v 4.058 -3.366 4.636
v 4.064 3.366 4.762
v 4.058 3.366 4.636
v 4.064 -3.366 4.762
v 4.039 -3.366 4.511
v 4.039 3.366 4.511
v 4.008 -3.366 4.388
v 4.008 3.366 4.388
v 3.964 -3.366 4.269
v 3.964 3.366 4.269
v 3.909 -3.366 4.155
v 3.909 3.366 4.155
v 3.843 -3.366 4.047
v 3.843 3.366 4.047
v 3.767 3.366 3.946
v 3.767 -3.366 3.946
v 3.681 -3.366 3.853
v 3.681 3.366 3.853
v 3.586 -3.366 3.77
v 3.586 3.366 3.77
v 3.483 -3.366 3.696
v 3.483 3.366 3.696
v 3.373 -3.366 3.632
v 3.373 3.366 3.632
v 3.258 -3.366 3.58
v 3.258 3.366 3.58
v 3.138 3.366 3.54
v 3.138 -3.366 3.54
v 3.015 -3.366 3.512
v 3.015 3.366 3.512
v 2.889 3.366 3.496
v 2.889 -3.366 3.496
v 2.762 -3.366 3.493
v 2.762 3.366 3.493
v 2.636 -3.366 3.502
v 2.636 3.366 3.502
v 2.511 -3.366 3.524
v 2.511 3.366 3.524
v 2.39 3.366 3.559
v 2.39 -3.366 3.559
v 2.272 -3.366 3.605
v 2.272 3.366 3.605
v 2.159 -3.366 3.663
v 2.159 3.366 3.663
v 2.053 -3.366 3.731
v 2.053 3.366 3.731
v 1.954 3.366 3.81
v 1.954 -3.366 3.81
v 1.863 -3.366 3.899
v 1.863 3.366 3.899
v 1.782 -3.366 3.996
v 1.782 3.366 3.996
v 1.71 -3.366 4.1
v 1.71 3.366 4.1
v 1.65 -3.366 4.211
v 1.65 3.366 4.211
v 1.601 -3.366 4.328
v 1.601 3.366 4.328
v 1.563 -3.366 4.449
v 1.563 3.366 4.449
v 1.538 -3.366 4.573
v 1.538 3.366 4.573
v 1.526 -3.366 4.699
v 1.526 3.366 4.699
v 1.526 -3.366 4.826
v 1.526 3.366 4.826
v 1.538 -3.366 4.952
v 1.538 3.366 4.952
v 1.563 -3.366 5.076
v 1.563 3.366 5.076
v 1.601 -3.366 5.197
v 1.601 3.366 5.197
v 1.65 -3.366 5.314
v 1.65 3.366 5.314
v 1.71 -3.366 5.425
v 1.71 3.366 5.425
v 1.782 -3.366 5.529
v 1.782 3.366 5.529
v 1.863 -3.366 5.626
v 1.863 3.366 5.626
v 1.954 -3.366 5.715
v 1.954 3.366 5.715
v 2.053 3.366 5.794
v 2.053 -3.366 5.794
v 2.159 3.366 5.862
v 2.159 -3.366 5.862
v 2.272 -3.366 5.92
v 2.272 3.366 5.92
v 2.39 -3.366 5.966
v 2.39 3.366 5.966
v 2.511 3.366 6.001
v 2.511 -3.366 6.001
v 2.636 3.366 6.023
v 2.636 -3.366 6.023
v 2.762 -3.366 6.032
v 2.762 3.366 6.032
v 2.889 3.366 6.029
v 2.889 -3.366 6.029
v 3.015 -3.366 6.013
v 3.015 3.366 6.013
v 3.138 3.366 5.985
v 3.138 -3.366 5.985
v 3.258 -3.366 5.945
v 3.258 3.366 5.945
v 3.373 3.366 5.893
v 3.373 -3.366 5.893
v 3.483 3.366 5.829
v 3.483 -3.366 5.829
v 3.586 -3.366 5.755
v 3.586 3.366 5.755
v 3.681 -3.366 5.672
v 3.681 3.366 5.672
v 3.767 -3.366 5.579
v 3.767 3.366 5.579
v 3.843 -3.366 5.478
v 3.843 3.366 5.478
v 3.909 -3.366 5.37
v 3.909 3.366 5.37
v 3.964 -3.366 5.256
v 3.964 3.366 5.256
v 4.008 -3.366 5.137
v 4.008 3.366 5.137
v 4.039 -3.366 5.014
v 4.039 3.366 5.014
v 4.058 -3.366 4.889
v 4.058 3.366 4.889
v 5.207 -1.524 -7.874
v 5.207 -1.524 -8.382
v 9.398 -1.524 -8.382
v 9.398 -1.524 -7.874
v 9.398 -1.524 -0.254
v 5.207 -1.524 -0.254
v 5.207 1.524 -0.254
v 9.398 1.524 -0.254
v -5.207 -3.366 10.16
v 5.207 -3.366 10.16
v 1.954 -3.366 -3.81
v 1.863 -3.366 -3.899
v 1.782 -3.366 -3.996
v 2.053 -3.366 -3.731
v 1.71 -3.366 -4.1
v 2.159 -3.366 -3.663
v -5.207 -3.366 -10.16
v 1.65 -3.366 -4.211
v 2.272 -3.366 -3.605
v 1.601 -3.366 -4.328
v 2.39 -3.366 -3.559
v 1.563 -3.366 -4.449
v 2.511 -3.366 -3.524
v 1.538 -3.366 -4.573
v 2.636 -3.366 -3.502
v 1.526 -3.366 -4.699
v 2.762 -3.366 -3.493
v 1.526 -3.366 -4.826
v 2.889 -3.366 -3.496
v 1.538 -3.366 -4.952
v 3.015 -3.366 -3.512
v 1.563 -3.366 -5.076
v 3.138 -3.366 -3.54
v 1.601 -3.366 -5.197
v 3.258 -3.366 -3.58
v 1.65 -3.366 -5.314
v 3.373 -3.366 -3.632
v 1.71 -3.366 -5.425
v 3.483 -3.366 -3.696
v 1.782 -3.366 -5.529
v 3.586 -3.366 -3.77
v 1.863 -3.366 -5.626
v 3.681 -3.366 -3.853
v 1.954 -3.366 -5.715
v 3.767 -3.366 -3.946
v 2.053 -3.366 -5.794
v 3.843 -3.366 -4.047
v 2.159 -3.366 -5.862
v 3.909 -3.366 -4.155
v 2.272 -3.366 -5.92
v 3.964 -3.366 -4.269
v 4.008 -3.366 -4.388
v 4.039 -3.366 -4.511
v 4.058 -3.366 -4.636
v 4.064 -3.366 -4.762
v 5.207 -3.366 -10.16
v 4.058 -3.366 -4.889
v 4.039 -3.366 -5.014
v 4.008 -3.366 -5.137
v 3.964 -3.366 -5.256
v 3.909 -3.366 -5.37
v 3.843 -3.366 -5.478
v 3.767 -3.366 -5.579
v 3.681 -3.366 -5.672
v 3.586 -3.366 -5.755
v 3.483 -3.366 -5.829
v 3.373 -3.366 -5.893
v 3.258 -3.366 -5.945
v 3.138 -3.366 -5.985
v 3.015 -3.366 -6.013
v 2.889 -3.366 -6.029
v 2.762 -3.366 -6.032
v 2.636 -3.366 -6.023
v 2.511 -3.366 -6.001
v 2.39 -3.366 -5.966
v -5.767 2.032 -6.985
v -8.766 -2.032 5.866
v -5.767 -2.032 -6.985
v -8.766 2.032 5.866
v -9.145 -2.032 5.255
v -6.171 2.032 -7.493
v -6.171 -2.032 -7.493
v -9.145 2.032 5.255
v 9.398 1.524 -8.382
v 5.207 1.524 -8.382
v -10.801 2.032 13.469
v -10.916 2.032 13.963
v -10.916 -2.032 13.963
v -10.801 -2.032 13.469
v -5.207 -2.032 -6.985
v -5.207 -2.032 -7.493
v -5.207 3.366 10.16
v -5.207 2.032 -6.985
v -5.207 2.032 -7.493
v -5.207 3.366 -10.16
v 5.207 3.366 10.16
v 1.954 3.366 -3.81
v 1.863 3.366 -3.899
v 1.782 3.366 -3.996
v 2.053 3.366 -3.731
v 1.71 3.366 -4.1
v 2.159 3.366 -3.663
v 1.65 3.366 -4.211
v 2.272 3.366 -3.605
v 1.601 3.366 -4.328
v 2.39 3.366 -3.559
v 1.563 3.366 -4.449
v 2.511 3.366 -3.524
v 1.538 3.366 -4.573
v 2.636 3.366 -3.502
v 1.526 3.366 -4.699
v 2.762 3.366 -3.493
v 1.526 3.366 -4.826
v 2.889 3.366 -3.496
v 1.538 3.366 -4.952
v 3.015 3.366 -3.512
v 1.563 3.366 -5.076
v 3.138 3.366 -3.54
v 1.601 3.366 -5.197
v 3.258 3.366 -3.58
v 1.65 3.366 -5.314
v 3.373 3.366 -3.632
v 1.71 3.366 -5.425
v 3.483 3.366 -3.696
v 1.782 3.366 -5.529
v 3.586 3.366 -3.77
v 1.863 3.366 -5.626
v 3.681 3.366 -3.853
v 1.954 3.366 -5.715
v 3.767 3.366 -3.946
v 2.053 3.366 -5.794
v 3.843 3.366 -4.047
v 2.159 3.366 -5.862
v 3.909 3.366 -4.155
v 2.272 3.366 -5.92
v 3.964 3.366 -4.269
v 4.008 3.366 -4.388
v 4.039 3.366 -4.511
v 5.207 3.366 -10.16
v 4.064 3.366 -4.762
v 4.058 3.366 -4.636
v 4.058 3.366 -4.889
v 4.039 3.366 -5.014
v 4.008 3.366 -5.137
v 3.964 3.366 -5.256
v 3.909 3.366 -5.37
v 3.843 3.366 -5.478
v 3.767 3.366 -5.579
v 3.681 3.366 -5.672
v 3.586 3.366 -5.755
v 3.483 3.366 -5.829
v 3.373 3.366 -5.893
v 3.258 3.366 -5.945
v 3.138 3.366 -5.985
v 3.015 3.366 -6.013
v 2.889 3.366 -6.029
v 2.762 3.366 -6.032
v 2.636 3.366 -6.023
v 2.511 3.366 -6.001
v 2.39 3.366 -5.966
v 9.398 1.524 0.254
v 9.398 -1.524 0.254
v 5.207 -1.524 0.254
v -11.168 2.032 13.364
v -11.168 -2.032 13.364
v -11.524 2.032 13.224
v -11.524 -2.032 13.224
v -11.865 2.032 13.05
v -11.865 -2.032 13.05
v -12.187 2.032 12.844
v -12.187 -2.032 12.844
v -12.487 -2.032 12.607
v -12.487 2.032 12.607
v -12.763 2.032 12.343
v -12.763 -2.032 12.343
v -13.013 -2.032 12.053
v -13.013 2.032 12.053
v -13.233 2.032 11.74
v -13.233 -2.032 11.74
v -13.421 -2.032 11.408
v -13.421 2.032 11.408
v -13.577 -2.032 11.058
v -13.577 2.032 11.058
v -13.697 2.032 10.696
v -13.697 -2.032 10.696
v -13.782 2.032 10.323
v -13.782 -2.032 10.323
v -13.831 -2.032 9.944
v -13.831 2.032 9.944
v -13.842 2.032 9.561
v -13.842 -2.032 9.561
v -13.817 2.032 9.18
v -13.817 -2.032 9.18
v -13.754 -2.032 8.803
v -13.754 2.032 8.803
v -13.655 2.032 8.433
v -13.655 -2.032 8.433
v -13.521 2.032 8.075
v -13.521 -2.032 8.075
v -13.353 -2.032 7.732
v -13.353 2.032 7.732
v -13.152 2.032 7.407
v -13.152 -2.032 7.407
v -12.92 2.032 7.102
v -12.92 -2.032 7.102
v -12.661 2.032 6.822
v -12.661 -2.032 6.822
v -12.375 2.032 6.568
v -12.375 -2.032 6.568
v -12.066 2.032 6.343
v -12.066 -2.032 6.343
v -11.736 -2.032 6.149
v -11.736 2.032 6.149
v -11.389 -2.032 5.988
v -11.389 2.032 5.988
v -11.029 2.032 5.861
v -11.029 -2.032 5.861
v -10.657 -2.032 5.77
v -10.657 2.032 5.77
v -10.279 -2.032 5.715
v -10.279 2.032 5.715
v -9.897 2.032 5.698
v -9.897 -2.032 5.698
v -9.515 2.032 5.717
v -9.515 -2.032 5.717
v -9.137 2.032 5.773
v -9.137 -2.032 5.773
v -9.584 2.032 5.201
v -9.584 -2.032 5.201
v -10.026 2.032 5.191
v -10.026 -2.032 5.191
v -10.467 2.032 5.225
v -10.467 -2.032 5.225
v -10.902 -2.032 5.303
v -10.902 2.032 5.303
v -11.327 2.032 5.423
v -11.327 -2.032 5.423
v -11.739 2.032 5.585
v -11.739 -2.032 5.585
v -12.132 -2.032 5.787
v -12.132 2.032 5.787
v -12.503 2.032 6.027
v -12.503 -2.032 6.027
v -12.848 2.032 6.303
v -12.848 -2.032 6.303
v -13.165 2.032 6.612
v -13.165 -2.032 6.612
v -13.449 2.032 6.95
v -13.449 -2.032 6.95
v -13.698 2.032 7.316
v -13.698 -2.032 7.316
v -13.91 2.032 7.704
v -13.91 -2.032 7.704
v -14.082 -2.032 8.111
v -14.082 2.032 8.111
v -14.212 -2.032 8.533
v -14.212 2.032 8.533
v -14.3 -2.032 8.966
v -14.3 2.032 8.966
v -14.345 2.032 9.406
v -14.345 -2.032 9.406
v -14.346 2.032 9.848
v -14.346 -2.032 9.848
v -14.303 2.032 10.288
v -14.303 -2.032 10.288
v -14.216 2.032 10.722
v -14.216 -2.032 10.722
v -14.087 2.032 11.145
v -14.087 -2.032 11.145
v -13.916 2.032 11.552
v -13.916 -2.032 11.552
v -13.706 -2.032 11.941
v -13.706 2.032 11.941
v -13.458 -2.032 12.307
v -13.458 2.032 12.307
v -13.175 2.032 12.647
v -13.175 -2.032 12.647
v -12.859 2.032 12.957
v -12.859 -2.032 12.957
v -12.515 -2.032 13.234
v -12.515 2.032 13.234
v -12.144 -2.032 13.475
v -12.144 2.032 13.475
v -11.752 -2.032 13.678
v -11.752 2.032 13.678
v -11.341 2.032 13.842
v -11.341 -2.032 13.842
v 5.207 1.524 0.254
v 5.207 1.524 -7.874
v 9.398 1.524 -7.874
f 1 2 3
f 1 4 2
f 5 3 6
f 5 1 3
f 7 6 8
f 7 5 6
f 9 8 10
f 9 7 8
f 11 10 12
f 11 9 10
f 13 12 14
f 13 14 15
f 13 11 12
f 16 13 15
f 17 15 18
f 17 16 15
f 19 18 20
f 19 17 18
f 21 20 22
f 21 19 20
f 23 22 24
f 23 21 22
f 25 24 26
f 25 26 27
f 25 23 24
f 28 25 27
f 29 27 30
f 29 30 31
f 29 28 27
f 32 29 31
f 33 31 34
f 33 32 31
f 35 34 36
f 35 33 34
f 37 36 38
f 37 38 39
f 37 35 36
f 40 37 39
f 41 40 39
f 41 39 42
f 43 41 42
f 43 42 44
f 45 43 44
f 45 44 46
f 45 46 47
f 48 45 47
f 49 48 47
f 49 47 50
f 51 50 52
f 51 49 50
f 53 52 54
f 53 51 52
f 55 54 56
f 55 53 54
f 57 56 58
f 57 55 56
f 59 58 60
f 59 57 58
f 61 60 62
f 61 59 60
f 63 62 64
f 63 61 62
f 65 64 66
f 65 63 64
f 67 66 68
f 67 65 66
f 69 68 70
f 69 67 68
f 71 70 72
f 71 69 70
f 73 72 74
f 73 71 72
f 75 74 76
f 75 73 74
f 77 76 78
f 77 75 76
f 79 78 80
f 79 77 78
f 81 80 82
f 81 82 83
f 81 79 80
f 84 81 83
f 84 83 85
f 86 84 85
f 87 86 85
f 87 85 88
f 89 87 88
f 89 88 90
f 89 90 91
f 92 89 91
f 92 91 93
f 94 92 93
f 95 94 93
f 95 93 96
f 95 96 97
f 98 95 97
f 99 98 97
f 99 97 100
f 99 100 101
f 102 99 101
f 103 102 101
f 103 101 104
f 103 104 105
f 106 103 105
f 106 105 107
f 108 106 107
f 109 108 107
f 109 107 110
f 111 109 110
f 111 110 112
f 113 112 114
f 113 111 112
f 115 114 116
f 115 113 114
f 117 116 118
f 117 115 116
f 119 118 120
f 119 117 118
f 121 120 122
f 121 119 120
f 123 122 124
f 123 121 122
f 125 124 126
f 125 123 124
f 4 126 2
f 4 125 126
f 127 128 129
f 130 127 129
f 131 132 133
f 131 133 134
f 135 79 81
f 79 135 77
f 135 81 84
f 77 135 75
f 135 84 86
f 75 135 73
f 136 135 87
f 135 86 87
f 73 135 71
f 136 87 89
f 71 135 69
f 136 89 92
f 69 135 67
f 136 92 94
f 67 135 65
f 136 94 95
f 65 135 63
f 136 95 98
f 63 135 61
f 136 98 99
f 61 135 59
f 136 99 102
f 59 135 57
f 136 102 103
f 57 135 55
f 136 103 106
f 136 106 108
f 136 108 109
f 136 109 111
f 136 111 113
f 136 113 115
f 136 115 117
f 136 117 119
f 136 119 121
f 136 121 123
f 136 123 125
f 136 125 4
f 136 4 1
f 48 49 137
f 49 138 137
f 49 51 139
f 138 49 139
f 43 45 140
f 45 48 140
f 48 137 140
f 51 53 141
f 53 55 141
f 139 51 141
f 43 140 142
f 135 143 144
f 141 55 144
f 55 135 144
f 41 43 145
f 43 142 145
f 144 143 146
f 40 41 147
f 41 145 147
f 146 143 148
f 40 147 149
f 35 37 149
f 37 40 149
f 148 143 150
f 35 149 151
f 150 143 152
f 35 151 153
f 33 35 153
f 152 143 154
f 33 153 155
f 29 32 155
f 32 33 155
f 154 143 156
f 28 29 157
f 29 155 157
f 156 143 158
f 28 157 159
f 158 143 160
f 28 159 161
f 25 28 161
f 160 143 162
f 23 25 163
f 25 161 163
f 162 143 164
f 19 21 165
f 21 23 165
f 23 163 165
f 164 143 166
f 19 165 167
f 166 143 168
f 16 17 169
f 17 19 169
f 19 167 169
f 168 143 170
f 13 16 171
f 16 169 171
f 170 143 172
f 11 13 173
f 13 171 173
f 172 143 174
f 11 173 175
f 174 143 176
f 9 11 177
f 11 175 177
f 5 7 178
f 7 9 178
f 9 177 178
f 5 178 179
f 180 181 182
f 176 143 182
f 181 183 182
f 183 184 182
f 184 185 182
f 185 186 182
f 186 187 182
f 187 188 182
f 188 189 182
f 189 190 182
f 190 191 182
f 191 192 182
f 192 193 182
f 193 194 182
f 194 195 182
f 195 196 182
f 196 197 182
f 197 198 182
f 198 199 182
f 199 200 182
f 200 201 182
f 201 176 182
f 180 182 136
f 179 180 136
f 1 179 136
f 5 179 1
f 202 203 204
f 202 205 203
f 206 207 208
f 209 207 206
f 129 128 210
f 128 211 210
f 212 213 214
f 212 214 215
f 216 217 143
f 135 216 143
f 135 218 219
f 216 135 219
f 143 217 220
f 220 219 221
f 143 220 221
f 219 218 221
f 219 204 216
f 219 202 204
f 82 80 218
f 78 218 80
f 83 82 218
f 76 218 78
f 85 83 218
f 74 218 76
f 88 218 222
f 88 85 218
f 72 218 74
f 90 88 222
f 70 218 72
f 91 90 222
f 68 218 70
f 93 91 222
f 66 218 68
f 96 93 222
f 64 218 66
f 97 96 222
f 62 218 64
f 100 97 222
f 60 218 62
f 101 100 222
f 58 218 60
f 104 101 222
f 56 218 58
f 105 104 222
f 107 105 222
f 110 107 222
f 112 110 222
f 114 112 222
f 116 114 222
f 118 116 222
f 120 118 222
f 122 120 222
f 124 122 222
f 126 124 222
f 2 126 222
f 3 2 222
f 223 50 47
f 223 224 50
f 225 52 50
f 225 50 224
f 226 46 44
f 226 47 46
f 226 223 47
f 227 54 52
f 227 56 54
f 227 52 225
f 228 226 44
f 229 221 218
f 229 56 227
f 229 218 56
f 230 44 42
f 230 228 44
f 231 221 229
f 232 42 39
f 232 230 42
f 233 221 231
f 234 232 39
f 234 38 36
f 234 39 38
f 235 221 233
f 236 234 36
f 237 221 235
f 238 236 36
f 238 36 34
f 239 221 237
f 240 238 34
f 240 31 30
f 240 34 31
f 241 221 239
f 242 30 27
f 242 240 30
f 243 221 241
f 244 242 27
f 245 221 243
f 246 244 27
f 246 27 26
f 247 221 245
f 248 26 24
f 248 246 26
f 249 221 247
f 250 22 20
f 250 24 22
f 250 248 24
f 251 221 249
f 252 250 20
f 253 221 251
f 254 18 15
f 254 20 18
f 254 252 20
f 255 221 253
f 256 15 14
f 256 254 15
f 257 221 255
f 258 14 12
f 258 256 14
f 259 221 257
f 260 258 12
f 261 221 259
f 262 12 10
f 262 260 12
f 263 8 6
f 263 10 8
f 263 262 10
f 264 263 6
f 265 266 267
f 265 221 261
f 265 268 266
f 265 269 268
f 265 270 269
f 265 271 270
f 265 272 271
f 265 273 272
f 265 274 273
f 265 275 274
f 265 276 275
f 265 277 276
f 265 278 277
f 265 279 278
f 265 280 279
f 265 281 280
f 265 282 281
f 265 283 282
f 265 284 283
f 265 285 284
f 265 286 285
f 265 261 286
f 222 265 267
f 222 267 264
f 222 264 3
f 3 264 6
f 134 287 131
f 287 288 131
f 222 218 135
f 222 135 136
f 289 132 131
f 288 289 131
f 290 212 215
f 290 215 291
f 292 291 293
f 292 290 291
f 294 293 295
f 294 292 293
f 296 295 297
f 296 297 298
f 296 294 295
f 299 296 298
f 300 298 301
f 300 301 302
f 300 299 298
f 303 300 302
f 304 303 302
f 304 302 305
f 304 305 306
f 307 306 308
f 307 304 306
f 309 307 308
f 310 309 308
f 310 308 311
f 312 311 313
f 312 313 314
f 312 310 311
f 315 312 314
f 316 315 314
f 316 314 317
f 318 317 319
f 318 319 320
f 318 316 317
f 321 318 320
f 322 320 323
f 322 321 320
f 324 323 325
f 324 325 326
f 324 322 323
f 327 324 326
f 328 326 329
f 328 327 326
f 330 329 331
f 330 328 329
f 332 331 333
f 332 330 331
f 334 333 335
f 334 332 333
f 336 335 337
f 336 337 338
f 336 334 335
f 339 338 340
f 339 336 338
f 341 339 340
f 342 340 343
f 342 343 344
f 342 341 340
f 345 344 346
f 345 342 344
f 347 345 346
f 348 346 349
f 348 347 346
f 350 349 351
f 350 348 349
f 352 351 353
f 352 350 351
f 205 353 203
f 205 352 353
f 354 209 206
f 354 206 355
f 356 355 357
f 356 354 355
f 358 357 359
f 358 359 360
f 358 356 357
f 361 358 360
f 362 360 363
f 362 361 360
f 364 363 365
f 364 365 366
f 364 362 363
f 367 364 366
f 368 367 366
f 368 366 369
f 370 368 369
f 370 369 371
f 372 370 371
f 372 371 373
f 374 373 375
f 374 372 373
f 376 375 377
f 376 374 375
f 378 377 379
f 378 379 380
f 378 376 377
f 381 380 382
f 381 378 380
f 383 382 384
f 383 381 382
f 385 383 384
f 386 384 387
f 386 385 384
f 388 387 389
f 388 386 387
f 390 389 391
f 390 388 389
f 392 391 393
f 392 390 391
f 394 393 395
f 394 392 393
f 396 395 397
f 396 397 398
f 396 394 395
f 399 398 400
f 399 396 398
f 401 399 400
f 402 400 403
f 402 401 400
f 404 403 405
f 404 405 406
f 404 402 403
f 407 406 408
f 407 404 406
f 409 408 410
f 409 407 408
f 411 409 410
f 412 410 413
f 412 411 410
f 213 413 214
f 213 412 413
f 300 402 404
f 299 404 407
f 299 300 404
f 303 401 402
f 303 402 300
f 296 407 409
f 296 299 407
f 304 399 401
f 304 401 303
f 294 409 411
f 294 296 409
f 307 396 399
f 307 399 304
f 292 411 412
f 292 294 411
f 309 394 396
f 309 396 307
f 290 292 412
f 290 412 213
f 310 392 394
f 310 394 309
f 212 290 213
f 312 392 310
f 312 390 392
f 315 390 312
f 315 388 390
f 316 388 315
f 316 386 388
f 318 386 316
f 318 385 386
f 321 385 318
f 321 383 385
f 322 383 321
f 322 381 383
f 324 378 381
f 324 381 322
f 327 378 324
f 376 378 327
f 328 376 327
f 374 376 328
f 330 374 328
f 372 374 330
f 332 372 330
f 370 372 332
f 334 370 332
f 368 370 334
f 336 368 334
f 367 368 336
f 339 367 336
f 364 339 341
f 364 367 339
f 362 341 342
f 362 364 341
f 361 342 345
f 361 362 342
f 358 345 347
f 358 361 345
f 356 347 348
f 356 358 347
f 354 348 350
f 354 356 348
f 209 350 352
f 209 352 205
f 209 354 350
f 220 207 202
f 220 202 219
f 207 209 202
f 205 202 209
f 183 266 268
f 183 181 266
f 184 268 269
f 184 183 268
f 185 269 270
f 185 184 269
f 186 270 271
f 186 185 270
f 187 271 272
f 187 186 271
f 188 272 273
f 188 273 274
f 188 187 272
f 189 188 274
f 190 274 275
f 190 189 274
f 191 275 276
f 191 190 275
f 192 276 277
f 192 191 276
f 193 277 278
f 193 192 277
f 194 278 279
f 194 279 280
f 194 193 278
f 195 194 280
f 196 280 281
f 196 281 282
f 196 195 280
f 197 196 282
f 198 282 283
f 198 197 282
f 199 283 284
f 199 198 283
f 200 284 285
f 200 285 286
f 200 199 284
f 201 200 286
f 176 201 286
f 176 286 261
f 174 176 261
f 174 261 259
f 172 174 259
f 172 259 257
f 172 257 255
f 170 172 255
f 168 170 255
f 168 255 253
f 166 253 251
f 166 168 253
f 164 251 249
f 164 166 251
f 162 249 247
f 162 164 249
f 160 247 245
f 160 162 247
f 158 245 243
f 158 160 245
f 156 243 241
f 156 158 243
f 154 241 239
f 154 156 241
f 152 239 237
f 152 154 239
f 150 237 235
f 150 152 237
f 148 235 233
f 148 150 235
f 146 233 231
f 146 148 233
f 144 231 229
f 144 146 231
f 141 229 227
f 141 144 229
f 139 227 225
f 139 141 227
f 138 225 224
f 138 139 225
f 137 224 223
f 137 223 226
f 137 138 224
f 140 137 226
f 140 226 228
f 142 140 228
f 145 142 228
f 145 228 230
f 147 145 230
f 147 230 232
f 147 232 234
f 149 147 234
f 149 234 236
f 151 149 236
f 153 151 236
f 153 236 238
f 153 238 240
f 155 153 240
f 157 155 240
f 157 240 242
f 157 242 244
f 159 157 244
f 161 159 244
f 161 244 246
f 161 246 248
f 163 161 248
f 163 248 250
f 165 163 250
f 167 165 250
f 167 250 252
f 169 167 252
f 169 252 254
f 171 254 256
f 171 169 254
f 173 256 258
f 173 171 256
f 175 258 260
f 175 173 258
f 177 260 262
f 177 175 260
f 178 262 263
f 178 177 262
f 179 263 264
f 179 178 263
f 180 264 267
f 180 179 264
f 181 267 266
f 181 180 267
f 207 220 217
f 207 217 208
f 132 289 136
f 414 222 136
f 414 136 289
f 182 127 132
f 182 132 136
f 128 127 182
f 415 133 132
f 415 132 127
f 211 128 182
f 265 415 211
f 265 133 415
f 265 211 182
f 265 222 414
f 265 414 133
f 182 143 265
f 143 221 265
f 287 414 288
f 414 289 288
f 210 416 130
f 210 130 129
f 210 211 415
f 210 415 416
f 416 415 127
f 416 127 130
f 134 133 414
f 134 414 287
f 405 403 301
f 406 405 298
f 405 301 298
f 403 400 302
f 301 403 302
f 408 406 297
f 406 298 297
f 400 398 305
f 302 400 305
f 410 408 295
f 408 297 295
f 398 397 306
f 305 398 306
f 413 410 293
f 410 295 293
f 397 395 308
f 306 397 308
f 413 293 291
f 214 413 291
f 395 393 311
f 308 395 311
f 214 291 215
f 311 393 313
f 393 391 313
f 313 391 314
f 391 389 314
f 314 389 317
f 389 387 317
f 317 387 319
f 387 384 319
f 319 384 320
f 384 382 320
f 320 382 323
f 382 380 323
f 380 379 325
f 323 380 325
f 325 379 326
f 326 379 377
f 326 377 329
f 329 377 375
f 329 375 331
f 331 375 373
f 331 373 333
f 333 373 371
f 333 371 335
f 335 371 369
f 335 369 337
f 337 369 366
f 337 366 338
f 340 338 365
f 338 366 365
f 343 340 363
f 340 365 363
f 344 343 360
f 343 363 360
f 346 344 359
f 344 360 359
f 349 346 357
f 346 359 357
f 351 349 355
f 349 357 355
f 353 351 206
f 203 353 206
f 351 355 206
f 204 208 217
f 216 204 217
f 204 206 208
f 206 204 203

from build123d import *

# Parameters (mm, degrees)
SKETCH1_R           = 1.27
BOSS_EXTRUDE1_DEPTH = 3.3655
SKETCH1_3_W         = 4.191
SKETCH1_3_H         = 0.508
BOSS_EXTRUDE2_DEPTH = 1.524
BOSS_EXTRUDE3_DEPTH = 2.032


with BuildPart() as part:
    # Sketch1 → Boss-Extrude1 (new, symmetric)
    with BuildSketch(Plane(origin=(0, 0, 0), x_dir=(1, 0, 0), z_dir=(0, 1, 0))):
        Polygon((5.207, 8.382), (5.207, 10.16), (-5.207, 10.16), (-5.207, 7.493), (-5.207, 6.985), (-5.207, -10.16), (5.207, -10.16), (5.207, -0.254), (5.207, 0.254), (5.207, 7.874), align=None)
        with Locations((2.794, -4.7625)):
            Circle(SKETCH1_R, mode=Mode.SUBTRACT)
        with Locations((2.794, 4.7625)):
            Circle(SKETCH1_R, mode=Mode.SUBTRACT)
    extrude(amount=BOSS_EXTRUDE1_DEPTH, both=True)

    # Sketch1<3> → Boss-Extrude2 (add, symmetric)
    with BuildSketch(Plane(origin=(0, 0, 0), x_dir=(1, 0, 0), z_dir=(0, 1, 0))):
        with Locations((7.3025, 8.128)):
            Rectangle(SKETCH1_3_W, SKETCH1_3_H)
        with Locations((7.3025, 0)):
            Rectangle(SKETCH1_3_W, SKETCH1_3_H)
    extrude(amount=BOSS_EXTRUDE2_DEPTH, both=True)

    # Sketch1<4> → Boss-Extrude3 (add, symmetric)
    with BuildSketch(Plane(origin=(0, 0, 0), x_dir=(1, 0, 0), z_dir=(0, 1, 0))):
        with BuildLine():
            Line((-5.207, 6.985), (-5.207, 7.493))
            Line((-5.207, 7.493), (-6.170558218, 7.493))
            Line((-6.170558218, 7.493), (-9.145014336, -5.25524689))
            ThreePointArc((-9.145014336, -5.25524689), (-14.261834387, -8.748771053), (-10.915992225, -13.963356246))
            Line((-10.915992225, -13.963356246), (-10.800564542, -13.468643754))
            ThreePointArc((-10.800564542, -13.468643754), (-13.709152444, -8.616780848), (-8.76594289, -5.866301519))
            Line((-8.76594289, -5.866301519), (-5.767441782, 6.985))
            Line((-5.767441782, 6.985), (-5.207, 6.985))
        make_face()
    extrude(amount=BOSS_EXTRUDE3_DEPTH, both=True)


solid = part.part
